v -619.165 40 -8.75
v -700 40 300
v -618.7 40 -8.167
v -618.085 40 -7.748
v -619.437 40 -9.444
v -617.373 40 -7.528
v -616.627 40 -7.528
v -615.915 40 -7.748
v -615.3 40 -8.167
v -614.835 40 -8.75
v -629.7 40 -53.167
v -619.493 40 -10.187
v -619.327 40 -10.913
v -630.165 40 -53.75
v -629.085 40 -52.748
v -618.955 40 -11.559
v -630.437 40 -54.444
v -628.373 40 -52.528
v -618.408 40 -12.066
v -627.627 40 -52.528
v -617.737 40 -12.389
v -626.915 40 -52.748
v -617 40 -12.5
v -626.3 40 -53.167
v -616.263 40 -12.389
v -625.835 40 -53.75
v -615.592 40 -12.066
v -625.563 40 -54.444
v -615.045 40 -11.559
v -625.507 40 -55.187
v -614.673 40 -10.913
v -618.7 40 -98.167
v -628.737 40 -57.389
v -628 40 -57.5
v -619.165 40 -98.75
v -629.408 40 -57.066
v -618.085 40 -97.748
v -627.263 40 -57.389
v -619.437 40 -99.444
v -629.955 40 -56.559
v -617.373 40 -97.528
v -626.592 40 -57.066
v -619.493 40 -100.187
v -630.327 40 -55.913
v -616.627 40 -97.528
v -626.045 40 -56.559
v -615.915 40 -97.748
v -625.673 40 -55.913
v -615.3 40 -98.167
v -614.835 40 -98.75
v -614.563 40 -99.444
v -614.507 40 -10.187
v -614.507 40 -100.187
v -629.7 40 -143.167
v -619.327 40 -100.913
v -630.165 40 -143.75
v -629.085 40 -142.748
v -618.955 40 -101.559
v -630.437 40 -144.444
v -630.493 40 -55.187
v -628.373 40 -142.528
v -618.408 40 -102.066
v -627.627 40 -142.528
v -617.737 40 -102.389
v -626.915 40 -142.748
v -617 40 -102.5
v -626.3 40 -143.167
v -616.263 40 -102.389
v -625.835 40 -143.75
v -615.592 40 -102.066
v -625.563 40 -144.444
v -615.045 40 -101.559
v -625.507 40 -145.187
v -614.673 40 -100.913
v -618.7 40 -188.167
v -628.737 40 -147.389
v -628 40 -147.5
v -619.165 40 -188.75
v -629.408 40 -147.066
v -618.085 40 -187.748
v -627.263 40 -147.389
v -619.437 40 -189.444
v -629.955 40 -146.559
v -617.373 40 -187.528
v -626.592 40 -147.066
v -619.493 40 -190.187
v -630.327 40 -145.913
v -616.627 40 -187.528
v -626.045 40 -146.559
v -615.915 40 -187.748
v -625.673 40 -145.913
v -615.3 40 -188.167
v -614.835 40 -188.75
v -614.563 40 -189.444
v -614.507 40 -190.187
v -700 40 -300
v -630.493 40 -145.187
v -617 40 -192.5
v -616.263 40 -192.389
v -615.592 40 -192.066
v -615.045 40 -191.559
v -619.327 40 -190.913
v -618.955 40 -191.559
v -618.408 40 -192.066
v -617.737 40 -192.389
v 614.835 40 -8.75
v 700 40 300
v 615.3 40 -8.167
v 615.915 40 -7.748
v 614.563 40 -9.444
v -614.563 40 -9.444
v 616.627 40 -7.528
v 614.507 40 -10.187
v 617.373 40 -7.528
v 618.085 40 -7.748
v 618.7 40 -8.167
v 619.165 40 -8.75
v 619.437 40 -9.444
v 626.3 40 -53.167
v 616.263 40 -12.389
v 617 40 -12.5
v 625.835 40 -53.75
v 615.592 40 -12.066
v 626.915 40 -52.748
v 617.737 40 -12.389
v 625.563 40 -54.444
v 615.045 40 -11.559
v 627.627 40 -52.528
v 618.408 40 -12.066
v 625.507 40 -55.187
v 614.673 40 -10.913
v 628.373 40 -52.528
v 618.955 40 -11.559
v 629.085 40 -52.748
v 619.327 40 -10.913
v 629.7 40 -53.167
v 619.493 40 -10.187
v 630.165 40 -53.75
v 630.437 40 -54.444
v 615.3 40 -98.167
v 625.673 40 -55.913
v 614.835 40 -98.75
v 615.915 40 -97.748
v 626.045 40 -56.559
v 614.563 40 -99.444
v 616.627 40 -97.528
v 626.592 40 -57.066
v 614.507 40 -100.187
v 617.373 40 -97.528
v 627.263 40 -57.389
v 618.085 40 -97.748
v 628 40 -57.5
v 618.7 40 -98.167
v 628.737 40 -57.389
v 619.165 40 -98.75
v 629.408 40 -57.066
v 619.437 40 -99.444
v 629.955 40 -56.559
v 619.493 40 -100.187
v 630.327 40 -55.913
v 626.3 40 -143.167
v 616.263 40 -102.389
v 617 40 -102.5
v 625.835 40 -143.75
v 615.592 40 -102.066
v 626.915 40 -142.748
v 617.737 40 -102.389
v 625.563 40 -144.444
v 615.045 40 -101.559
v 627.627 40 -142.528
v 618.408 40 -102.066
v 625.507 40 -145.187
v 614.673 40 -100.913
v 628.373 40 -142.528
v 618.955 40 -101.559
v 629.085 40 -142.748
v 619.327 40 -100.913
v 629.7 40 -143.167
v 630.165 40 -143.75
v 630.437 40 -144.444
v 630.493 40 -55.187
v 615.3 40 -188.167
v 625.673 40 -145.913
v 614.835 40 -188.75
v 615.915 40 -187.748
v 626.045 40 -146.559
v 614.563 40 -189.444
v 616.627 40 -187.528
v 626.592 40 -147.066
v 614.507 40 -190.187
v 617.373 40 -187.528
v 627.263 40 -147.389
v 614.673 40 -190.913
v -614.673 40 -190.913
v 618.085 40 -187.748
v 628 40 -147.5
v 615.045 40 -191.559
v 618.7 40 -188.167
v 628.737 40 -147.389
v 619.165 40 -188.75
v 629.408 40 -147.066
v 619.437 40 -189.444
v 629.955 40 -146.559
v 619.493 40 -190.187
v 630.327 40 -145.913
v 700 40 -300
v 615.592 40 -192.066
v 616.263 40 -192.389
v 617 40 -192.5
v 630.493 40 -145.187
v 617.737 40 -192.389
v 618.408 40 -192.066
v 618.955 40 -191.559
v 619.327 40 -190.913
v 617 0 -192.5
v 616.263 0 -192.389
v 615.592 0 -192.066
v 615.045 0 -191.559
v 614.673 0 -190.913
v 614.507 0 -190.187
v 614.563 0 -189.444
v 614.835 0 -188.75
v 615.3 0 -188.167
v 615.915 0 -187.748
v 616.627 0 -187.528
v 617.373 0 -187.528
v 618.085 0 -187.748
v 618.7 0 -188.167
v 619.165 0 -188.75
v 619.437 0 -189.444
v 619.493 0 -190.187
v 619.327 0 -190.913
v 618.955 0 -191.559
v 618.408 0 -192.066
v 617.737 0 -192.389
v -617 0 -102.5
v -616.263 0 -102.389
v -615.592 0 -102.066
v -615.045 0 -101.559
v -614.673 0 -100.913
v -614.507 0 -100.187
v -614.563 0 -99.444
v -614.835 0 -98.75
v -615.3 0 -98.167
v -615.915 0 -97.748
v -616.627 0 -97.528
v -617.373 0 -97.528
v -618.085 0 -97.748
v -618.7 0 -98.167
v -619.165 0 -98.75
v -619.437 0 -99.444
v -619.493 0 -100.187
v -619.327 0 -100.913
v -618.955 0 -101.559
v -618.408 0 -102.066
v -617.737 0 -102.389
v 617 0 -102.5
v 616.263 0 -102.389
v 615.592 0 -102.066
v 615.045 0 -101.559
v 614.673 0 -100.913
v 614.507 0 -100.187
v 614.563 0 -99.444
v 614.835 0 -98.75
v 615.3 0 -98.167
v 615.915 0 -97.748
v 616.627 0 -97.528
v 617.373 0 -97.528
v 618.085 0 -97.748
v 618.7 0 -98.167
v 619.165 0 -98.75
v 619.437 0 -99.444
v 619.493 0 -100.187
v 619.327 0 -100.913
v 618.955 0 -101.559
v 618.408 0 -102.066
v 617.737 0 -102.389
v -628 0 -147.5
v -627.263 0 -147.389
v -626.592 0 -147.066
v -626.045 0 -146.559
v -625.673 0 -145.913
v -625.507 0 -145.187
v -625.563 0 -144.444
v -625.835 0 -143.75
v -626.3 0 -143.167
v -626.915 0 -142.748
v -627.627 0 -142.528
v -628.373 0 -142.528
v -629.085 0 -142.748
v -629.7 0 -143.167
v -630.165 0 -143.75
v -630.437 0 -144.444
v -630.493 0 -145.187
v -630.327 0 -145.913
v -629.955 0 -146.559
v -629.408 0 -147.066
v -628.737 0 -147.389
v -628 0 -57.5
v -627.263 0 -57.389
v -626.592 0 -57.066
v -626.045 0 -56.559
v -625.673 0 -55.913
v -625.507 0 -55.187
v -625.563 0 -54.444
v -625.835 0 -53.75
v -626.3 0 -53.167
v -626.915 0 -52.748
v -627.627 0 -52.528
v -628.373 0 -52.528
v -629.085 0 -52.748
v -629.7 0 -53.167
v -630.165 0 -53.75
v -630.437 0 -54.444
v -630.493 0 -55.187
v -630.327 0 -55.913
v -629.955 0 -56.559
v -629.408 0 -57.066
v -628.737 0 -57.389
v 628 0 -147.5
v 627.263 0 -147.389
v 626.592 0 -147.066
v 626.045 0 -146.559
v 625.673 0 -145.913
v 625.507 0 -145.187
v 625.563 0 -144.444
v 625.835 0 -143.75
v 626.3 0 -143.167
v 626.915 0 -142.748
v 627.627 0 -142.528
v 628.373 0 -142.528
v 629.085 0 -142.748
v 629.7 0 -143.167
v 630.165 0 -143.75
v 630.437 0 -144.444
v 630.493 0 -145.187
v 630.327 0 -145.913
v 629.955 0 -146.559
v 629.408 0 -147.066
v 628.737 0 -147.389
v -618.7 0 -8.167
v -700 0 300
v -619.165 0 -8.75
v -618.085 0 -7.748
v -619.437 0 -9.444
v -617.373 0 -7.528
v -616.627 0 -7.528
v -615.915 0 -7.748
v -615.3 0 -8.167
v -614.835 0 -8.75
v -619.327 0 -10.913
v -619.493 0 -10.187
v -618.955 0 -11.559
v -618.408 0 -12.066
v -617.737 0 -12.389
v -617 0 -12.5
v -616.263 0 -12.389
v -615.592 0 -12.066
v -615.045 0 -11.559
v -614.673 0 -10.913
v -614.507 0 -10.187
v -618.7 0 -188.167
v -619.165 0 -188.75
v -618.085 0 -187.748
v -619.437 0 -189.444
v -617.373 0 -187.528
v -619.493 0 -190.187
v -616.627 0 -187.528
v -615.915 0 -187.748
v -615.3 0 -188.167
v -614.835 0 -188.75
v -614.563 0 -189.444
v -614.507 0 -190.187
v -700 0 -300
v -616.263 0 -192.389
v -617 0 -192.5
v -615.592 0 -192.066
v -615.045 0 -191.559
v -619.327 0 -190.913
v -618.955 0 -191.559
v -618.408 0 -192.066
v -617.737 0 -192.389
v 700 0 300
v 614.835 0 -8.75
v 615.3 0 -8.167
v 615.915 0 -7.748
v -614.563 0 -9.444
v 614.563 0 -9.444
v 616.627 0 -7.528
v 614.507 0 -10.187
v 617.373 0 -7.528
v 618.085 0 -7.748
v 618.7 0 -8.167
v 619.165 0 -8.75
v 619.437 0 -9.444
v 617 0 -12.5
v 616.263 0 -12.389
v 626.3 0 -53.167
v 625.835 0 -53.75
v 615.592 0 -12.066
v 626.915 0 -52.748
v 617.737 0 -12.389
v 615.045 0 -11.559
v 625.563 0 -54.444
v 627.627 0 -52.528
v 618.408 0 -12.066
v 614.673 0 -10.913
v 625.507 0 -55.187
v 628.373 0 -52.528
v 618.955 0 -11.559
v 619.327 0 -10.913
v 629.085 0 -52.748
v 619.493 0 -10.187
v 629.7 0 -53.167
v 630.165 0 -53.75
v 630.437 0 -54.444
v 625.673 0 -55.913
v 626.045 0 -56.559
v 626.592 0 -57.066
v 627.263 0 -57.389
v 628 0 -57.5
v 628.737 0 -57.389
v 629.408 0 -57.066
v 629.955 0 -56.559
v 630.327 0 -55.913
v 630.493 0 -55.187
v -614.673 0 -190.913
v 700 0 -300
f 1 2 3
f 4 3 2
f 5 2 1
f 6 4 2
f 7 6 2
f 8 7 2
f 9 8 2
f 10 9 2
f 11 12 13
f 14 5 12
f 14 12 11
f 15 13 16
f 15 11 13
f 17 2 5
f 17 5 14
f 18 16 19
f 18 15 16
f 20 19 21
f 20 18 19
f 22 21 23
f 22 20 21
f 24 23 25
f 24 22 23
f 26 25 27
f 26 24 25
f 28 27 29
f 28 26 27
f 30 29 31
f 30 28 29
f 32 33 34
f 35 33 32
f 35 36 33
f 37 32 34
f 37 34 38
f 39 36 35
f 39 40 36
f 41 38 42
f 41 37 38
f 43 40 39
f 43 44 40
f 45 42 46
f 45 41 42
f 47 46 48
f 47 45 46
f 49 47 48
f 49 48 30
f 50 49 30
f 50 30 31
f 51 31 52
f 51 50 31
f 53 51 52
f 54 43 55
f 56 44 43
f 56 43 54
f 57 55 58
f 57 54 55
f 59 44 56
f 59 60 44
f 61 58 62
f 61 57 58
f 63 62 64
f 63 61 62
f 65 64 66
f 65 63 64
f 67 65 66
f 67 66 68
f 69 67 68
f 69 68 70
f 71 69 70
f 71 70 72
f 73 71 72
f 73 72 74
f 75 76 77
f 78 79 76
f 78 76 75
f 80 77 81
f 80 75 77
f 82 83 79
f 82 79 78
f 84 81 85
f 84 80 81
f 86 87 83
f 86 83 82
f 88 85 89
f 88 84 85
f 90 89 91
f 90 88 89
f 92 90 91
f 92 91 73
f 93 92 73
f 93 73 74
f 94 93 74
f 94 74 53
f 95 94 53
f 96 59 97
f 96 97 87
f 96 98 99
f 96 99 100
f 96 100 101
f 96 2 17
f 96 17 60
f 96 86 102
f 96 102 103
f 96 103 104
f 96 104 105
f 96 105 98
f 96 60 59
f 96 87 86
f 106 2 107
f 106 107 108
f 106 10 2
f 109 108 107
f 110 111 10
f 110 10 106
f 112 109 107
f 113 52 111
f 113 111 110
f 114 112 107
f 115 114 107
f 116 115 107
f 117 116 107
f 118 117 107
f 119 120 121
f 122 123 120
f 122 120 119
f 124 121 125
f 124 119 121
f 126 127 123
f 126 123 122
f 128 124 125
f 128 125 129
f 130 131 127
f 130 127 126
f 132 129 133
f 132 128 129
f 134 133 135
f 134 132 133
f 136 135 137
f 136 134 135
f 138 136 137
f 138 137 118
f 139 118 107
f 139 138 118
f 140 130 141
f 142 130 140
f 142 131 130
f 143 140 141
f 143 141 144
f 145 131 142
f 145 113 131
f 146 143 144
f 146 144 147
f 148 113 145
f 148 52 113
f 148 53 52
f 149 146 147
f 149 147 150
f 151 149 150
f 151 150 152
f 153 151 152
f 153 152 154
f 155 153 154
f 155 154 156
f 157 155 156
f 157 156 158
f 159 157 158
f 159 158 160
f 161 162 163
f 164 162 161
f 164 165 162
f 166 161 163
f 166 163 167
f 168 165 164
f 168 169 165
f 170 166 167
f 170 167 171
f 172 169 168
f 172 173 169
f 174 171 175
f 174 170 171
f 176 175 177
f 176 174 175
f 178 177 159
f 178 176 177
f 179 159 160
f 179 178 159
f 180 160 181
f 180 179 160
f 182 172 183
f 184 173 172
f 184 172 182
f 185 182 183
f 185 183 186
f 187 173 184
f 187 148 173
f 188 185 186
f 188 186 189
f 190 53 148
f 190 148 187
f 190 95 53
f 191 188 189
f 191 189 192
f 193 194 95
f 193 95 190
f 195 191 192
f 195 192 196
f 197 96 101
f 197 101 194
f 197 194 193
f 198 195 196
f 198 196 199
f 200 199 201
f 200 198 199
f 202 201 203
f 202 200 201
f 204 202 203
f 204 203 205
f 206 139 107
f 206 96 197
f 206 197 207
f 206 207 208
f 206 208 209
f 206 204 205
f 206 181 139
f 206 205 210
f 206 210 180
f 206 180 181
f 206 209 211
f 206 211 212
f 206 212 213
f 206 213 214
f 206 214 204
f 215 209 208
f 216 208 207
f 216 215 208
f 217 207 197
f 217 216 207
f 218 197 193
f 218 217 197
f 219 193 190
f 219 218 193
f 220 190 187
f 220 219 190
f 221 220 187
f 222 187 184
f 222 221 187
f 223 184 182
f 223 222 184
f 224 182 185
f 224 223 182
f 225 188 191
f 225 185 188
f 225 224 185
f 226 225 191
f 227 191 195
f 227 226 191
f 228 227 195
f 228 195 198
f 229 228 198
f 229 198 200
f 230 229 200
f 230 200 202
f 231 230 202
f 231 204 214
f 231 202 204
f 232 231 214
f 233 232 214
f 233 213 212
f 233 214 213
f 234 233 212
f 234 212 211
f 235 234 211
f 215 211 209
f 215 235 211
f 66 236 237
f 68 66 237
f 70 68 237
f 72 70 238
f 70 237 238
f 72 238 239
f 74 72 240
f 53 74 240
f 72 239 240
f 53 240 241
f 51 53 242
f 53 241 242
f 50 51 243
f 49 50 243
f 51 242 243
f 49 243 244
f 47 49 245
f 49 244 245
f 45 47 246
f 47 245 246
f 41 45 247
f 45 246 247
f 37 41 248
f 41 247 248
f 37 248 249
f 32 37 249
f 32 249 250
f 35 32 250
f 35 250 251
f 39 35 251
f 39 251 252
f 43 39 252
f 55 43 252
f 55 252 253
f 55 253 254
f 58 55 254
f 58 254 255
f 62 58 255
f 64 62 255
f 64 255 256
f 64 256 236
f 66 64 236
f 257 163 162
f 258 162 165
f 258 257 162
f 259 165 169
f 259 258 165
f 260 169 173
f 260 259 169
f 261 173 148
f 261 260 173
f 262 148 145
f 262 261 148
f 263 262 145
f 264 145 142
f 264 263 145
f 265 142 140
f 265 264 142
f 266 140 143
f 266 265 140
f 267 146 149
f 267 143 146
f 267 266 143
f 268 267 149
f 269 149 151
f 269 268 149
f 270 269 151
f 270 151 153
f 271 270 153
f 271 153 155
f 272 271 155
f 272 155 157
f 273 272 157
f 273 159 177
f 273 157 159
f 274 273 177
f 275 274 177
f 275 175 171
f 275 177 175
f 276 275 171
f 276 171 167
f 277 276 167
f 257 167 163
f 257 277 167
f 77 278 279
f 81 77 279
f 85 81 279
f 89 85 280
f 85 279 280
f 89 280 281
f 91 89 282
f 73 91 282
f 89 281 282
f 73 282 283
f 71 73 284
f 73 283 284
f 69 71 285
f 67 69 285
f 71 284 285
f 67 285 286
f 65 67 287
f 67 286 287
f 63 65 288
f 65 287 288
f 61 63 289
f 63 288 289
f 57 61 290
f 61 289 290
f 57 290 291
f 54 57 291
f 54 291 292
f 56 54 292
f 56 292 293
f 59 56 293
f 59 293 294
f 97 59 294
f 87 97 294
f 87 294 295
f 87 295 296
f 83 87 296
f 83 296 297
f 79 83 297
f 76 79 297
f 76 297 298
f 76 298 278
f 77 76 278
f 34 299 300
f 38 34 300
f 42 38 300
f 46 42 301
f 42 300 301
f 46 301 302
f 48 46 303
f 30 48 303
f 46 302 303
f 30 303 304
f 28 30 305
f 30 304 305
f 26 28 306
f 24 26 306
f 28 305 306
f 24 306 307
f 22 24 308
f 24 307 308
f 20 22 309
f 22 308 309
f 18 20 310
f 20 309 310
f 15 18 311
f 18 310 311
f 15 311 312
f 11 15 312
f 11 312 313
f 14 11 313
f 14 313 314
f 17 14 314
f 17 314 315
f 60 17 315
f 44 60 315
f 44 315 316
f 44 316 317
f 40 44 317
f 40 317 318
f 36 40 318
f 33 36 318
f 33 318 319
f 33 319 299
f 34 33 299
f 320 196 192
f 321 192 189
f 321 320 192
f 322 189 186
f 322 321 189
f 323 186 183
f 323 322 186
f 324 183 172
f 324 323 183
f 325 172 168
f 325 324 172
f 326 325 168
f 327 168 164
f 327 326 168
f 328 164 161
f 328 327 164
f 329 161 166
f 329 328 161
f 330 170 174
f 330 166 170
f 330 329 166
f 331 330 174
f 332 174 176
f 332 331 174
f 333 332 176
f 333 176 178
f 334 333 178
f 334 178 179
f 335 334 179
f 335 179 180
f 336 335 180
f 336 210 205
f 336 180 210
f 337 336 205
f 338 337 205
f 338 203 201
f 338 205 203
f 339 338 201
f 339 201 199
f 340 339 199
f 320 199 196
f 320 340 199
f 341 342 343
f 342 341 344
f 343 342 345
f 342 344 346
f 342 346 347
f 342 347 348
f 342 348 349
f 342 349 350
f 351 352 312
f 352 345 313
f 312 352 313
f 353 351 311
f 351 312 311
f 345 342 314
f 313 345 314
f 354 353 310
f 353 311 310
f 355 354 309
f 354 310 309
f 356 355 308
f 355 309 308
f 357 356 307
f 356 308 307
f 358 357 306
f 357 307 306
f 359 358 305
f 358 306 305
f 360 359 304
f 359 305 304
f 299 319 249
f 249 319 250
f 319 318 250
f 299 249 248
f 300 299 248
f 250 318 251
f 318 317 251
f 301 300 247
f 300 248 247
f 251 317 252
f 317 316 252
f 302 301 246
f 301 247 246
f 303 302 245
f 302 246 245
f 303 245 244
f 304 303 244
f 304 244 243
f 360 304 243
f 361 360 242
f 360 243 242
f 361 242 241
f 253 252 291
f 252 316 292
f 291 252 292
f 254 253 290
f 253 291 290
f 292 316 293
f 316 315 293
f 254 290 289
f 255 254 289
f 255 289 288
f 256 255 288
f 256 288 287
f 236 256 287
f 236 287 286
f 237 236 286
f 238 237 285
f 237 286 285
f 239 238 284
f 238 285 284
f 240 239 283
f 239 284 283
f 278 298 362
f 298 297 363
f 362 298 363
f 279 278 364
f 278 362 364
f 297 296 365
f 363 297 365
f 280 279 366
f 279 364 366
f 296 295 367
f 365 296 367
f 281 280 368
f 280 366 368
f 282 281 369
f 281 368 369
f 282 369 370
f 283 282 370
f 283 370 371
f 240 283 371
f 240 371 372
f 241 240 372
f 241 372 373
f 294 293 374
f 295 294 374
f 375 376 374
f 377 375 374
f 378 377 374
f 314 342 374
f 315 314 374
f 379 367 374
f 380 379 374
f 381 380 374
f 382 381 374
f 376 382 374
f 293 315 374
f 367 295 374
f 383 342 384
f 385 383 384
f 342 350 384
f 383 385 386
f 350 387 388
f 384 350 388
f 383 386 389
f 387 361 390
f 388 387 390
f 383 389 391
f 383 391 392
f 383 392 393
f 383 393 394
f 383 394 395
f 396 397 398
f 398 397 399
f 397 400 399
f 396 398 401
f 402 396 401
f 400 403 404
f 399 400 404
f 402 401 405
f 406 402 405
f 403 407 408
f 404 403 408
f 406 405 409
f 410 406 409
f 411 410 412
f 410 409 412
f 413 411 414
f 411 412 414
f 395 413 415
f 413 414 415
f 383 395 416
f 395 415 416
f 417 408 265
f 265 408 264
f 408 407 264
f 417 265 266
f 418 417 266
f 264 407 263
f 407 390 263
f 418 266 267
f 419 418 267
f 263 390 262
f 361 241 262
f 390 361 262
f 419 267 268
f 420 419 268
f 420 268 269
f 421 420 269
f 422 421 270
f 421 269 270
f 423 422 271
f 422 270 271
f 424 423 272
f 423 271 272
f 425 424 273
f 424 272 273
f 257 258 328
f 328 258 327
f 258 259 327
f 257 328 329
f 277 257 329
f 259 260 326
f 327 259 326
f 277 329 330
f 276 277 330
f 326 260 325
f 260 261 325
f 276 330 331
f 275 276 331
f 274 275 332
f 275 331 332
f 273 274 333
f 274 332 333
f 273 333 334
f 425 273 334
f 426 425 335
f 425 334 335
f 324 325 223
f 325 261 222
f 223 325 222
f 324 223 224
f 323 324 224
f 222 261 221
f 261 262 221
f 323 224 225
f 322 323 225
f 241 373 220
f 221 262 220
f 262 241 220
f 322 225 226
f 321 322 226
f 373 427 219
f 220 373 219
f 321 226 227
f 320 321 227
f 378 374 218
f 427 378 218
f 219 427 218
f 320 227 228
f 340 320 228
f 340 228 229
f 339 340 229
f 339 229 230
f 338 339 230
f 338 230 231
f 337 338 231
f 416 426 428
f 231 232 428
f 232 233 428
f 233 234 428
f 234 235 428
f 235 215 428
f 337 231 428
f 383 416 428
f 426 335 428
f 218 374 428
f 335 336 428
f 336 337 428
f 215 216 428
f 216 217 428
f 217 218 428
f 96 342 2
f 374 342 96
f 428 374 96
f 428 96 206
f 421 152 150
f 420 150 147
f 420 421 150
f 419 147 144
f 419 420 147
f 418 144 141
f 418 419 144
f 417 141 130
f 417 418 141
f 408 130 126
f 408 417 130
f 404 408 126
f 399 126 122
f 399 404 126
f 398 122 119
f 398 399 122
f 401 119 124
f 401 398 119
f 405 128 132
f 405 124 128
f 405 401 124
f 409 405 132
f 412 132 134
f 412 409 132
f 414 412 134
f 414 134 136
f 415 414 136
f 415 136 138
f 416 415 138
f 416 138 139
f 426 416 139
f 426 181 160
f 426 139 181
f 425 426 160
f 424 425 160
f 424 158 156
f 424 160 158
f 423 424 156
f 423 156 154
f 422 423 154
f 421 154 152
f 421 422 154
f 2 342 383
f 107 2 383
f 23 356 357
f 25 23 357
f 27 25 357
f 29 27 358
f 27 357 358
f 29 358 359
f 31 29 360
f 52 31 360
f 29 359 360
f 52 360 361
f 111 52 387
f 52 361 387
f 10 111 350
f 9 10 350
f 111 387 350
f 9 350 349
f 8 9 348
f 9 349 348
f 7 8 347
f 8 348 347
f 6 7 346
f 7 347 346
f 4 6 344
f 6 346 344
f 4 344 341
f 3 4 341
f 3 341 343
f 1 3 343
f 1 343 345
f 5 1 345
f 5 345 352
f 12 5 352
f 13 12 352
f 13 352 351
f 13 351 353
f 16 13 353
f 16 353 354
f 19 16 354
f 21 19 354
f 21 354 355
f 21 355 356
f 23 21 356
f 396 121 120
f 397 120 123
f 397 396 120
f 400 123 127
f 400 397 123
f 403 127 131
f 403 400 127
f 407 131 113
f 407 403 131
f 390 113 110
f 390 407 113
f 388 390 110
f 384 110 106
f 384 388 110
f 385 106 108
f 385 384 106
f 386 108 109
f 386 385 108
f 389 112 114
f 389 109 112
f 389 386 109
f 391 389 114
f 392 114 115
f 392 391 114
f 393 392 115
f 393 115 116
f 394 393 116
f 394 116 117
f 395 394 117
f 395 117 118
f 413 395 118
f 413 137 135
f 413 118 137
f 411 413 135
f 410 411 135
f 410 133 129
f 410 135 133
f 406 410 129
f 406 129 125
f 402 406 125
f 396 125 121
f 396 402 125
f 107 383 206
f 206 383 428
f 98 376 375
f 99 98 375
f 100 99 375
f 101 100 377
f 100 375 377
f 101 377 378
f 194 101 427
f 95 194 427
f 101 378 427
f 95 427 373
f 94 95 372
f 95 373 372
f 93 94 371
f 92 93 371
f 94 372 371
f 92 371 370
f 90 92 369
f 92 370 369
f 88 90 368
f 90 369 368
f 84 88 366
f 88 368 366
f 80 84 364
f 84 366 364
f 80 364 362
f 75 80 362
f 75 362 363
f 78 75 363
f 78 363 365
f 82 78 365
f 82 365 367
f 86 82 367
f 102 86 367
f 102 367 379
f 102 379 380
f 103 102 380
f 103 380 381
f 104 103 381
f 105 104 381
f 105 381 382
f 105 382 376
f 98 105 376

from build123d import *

# Parameters (mm, degrees)
SKETCH1_W           = 1400
SKETCH1_H           = 600
BOSS_EXTRUDE1_DEPTH = 40
SKETCH2_R           = 2.5
CUT_EXTRUDE9_DEPTH  = 70


with BuildPart() as part:
    # Sketch1 → Boss-Extrude1 (new body)
    with BuildSketch(Plane(origin=(0, 0, 0), x_dir=(1, 0, 0), z_dir=(0, 1, 0))):
        Rectangle(SKETCH1_W, SKETCH1_H)
    extrude(amount=BOSS_EXTRUDE1_DEPTH)

    # Sketch2 → Cut-Extrude9 (cut)
    with BuildSketch(Plane(origin=(0, 0, 0), x_dir=(1, 0, 0), z_dir=(0, 1, 0))):
        with Locations(Location((617, 10, 0), (0, 0, 90))):
            Circle(SKETCH2_R)
        with Locations(Location((628, 55, 0), (0, 0, 90))):
            Circle(SKETCH2_R)
        with Locations(Location((617, 100, 0), (0, 0, 90))):
            Circle(SKETCH2_R)
        with Locations(Location((628, 145, 0), (0, 0, 90))):
            Circle(SKETCH2_R)
        with Locations(Location((617, 190, 0), (0, 0, 90))):
            Circle(SKETCH2_R)
    cut_extrude9 = extrude(amount=CUT_EXTRUDE9_DEPTH, mode=Mode.SUBTRACT)

    # Mirror1: Cut-Extrude9 across plane
    add(cut_extrude9.mirror(Plane.ZY), mode=Mode.SUBTRACT)


solid = part.part
